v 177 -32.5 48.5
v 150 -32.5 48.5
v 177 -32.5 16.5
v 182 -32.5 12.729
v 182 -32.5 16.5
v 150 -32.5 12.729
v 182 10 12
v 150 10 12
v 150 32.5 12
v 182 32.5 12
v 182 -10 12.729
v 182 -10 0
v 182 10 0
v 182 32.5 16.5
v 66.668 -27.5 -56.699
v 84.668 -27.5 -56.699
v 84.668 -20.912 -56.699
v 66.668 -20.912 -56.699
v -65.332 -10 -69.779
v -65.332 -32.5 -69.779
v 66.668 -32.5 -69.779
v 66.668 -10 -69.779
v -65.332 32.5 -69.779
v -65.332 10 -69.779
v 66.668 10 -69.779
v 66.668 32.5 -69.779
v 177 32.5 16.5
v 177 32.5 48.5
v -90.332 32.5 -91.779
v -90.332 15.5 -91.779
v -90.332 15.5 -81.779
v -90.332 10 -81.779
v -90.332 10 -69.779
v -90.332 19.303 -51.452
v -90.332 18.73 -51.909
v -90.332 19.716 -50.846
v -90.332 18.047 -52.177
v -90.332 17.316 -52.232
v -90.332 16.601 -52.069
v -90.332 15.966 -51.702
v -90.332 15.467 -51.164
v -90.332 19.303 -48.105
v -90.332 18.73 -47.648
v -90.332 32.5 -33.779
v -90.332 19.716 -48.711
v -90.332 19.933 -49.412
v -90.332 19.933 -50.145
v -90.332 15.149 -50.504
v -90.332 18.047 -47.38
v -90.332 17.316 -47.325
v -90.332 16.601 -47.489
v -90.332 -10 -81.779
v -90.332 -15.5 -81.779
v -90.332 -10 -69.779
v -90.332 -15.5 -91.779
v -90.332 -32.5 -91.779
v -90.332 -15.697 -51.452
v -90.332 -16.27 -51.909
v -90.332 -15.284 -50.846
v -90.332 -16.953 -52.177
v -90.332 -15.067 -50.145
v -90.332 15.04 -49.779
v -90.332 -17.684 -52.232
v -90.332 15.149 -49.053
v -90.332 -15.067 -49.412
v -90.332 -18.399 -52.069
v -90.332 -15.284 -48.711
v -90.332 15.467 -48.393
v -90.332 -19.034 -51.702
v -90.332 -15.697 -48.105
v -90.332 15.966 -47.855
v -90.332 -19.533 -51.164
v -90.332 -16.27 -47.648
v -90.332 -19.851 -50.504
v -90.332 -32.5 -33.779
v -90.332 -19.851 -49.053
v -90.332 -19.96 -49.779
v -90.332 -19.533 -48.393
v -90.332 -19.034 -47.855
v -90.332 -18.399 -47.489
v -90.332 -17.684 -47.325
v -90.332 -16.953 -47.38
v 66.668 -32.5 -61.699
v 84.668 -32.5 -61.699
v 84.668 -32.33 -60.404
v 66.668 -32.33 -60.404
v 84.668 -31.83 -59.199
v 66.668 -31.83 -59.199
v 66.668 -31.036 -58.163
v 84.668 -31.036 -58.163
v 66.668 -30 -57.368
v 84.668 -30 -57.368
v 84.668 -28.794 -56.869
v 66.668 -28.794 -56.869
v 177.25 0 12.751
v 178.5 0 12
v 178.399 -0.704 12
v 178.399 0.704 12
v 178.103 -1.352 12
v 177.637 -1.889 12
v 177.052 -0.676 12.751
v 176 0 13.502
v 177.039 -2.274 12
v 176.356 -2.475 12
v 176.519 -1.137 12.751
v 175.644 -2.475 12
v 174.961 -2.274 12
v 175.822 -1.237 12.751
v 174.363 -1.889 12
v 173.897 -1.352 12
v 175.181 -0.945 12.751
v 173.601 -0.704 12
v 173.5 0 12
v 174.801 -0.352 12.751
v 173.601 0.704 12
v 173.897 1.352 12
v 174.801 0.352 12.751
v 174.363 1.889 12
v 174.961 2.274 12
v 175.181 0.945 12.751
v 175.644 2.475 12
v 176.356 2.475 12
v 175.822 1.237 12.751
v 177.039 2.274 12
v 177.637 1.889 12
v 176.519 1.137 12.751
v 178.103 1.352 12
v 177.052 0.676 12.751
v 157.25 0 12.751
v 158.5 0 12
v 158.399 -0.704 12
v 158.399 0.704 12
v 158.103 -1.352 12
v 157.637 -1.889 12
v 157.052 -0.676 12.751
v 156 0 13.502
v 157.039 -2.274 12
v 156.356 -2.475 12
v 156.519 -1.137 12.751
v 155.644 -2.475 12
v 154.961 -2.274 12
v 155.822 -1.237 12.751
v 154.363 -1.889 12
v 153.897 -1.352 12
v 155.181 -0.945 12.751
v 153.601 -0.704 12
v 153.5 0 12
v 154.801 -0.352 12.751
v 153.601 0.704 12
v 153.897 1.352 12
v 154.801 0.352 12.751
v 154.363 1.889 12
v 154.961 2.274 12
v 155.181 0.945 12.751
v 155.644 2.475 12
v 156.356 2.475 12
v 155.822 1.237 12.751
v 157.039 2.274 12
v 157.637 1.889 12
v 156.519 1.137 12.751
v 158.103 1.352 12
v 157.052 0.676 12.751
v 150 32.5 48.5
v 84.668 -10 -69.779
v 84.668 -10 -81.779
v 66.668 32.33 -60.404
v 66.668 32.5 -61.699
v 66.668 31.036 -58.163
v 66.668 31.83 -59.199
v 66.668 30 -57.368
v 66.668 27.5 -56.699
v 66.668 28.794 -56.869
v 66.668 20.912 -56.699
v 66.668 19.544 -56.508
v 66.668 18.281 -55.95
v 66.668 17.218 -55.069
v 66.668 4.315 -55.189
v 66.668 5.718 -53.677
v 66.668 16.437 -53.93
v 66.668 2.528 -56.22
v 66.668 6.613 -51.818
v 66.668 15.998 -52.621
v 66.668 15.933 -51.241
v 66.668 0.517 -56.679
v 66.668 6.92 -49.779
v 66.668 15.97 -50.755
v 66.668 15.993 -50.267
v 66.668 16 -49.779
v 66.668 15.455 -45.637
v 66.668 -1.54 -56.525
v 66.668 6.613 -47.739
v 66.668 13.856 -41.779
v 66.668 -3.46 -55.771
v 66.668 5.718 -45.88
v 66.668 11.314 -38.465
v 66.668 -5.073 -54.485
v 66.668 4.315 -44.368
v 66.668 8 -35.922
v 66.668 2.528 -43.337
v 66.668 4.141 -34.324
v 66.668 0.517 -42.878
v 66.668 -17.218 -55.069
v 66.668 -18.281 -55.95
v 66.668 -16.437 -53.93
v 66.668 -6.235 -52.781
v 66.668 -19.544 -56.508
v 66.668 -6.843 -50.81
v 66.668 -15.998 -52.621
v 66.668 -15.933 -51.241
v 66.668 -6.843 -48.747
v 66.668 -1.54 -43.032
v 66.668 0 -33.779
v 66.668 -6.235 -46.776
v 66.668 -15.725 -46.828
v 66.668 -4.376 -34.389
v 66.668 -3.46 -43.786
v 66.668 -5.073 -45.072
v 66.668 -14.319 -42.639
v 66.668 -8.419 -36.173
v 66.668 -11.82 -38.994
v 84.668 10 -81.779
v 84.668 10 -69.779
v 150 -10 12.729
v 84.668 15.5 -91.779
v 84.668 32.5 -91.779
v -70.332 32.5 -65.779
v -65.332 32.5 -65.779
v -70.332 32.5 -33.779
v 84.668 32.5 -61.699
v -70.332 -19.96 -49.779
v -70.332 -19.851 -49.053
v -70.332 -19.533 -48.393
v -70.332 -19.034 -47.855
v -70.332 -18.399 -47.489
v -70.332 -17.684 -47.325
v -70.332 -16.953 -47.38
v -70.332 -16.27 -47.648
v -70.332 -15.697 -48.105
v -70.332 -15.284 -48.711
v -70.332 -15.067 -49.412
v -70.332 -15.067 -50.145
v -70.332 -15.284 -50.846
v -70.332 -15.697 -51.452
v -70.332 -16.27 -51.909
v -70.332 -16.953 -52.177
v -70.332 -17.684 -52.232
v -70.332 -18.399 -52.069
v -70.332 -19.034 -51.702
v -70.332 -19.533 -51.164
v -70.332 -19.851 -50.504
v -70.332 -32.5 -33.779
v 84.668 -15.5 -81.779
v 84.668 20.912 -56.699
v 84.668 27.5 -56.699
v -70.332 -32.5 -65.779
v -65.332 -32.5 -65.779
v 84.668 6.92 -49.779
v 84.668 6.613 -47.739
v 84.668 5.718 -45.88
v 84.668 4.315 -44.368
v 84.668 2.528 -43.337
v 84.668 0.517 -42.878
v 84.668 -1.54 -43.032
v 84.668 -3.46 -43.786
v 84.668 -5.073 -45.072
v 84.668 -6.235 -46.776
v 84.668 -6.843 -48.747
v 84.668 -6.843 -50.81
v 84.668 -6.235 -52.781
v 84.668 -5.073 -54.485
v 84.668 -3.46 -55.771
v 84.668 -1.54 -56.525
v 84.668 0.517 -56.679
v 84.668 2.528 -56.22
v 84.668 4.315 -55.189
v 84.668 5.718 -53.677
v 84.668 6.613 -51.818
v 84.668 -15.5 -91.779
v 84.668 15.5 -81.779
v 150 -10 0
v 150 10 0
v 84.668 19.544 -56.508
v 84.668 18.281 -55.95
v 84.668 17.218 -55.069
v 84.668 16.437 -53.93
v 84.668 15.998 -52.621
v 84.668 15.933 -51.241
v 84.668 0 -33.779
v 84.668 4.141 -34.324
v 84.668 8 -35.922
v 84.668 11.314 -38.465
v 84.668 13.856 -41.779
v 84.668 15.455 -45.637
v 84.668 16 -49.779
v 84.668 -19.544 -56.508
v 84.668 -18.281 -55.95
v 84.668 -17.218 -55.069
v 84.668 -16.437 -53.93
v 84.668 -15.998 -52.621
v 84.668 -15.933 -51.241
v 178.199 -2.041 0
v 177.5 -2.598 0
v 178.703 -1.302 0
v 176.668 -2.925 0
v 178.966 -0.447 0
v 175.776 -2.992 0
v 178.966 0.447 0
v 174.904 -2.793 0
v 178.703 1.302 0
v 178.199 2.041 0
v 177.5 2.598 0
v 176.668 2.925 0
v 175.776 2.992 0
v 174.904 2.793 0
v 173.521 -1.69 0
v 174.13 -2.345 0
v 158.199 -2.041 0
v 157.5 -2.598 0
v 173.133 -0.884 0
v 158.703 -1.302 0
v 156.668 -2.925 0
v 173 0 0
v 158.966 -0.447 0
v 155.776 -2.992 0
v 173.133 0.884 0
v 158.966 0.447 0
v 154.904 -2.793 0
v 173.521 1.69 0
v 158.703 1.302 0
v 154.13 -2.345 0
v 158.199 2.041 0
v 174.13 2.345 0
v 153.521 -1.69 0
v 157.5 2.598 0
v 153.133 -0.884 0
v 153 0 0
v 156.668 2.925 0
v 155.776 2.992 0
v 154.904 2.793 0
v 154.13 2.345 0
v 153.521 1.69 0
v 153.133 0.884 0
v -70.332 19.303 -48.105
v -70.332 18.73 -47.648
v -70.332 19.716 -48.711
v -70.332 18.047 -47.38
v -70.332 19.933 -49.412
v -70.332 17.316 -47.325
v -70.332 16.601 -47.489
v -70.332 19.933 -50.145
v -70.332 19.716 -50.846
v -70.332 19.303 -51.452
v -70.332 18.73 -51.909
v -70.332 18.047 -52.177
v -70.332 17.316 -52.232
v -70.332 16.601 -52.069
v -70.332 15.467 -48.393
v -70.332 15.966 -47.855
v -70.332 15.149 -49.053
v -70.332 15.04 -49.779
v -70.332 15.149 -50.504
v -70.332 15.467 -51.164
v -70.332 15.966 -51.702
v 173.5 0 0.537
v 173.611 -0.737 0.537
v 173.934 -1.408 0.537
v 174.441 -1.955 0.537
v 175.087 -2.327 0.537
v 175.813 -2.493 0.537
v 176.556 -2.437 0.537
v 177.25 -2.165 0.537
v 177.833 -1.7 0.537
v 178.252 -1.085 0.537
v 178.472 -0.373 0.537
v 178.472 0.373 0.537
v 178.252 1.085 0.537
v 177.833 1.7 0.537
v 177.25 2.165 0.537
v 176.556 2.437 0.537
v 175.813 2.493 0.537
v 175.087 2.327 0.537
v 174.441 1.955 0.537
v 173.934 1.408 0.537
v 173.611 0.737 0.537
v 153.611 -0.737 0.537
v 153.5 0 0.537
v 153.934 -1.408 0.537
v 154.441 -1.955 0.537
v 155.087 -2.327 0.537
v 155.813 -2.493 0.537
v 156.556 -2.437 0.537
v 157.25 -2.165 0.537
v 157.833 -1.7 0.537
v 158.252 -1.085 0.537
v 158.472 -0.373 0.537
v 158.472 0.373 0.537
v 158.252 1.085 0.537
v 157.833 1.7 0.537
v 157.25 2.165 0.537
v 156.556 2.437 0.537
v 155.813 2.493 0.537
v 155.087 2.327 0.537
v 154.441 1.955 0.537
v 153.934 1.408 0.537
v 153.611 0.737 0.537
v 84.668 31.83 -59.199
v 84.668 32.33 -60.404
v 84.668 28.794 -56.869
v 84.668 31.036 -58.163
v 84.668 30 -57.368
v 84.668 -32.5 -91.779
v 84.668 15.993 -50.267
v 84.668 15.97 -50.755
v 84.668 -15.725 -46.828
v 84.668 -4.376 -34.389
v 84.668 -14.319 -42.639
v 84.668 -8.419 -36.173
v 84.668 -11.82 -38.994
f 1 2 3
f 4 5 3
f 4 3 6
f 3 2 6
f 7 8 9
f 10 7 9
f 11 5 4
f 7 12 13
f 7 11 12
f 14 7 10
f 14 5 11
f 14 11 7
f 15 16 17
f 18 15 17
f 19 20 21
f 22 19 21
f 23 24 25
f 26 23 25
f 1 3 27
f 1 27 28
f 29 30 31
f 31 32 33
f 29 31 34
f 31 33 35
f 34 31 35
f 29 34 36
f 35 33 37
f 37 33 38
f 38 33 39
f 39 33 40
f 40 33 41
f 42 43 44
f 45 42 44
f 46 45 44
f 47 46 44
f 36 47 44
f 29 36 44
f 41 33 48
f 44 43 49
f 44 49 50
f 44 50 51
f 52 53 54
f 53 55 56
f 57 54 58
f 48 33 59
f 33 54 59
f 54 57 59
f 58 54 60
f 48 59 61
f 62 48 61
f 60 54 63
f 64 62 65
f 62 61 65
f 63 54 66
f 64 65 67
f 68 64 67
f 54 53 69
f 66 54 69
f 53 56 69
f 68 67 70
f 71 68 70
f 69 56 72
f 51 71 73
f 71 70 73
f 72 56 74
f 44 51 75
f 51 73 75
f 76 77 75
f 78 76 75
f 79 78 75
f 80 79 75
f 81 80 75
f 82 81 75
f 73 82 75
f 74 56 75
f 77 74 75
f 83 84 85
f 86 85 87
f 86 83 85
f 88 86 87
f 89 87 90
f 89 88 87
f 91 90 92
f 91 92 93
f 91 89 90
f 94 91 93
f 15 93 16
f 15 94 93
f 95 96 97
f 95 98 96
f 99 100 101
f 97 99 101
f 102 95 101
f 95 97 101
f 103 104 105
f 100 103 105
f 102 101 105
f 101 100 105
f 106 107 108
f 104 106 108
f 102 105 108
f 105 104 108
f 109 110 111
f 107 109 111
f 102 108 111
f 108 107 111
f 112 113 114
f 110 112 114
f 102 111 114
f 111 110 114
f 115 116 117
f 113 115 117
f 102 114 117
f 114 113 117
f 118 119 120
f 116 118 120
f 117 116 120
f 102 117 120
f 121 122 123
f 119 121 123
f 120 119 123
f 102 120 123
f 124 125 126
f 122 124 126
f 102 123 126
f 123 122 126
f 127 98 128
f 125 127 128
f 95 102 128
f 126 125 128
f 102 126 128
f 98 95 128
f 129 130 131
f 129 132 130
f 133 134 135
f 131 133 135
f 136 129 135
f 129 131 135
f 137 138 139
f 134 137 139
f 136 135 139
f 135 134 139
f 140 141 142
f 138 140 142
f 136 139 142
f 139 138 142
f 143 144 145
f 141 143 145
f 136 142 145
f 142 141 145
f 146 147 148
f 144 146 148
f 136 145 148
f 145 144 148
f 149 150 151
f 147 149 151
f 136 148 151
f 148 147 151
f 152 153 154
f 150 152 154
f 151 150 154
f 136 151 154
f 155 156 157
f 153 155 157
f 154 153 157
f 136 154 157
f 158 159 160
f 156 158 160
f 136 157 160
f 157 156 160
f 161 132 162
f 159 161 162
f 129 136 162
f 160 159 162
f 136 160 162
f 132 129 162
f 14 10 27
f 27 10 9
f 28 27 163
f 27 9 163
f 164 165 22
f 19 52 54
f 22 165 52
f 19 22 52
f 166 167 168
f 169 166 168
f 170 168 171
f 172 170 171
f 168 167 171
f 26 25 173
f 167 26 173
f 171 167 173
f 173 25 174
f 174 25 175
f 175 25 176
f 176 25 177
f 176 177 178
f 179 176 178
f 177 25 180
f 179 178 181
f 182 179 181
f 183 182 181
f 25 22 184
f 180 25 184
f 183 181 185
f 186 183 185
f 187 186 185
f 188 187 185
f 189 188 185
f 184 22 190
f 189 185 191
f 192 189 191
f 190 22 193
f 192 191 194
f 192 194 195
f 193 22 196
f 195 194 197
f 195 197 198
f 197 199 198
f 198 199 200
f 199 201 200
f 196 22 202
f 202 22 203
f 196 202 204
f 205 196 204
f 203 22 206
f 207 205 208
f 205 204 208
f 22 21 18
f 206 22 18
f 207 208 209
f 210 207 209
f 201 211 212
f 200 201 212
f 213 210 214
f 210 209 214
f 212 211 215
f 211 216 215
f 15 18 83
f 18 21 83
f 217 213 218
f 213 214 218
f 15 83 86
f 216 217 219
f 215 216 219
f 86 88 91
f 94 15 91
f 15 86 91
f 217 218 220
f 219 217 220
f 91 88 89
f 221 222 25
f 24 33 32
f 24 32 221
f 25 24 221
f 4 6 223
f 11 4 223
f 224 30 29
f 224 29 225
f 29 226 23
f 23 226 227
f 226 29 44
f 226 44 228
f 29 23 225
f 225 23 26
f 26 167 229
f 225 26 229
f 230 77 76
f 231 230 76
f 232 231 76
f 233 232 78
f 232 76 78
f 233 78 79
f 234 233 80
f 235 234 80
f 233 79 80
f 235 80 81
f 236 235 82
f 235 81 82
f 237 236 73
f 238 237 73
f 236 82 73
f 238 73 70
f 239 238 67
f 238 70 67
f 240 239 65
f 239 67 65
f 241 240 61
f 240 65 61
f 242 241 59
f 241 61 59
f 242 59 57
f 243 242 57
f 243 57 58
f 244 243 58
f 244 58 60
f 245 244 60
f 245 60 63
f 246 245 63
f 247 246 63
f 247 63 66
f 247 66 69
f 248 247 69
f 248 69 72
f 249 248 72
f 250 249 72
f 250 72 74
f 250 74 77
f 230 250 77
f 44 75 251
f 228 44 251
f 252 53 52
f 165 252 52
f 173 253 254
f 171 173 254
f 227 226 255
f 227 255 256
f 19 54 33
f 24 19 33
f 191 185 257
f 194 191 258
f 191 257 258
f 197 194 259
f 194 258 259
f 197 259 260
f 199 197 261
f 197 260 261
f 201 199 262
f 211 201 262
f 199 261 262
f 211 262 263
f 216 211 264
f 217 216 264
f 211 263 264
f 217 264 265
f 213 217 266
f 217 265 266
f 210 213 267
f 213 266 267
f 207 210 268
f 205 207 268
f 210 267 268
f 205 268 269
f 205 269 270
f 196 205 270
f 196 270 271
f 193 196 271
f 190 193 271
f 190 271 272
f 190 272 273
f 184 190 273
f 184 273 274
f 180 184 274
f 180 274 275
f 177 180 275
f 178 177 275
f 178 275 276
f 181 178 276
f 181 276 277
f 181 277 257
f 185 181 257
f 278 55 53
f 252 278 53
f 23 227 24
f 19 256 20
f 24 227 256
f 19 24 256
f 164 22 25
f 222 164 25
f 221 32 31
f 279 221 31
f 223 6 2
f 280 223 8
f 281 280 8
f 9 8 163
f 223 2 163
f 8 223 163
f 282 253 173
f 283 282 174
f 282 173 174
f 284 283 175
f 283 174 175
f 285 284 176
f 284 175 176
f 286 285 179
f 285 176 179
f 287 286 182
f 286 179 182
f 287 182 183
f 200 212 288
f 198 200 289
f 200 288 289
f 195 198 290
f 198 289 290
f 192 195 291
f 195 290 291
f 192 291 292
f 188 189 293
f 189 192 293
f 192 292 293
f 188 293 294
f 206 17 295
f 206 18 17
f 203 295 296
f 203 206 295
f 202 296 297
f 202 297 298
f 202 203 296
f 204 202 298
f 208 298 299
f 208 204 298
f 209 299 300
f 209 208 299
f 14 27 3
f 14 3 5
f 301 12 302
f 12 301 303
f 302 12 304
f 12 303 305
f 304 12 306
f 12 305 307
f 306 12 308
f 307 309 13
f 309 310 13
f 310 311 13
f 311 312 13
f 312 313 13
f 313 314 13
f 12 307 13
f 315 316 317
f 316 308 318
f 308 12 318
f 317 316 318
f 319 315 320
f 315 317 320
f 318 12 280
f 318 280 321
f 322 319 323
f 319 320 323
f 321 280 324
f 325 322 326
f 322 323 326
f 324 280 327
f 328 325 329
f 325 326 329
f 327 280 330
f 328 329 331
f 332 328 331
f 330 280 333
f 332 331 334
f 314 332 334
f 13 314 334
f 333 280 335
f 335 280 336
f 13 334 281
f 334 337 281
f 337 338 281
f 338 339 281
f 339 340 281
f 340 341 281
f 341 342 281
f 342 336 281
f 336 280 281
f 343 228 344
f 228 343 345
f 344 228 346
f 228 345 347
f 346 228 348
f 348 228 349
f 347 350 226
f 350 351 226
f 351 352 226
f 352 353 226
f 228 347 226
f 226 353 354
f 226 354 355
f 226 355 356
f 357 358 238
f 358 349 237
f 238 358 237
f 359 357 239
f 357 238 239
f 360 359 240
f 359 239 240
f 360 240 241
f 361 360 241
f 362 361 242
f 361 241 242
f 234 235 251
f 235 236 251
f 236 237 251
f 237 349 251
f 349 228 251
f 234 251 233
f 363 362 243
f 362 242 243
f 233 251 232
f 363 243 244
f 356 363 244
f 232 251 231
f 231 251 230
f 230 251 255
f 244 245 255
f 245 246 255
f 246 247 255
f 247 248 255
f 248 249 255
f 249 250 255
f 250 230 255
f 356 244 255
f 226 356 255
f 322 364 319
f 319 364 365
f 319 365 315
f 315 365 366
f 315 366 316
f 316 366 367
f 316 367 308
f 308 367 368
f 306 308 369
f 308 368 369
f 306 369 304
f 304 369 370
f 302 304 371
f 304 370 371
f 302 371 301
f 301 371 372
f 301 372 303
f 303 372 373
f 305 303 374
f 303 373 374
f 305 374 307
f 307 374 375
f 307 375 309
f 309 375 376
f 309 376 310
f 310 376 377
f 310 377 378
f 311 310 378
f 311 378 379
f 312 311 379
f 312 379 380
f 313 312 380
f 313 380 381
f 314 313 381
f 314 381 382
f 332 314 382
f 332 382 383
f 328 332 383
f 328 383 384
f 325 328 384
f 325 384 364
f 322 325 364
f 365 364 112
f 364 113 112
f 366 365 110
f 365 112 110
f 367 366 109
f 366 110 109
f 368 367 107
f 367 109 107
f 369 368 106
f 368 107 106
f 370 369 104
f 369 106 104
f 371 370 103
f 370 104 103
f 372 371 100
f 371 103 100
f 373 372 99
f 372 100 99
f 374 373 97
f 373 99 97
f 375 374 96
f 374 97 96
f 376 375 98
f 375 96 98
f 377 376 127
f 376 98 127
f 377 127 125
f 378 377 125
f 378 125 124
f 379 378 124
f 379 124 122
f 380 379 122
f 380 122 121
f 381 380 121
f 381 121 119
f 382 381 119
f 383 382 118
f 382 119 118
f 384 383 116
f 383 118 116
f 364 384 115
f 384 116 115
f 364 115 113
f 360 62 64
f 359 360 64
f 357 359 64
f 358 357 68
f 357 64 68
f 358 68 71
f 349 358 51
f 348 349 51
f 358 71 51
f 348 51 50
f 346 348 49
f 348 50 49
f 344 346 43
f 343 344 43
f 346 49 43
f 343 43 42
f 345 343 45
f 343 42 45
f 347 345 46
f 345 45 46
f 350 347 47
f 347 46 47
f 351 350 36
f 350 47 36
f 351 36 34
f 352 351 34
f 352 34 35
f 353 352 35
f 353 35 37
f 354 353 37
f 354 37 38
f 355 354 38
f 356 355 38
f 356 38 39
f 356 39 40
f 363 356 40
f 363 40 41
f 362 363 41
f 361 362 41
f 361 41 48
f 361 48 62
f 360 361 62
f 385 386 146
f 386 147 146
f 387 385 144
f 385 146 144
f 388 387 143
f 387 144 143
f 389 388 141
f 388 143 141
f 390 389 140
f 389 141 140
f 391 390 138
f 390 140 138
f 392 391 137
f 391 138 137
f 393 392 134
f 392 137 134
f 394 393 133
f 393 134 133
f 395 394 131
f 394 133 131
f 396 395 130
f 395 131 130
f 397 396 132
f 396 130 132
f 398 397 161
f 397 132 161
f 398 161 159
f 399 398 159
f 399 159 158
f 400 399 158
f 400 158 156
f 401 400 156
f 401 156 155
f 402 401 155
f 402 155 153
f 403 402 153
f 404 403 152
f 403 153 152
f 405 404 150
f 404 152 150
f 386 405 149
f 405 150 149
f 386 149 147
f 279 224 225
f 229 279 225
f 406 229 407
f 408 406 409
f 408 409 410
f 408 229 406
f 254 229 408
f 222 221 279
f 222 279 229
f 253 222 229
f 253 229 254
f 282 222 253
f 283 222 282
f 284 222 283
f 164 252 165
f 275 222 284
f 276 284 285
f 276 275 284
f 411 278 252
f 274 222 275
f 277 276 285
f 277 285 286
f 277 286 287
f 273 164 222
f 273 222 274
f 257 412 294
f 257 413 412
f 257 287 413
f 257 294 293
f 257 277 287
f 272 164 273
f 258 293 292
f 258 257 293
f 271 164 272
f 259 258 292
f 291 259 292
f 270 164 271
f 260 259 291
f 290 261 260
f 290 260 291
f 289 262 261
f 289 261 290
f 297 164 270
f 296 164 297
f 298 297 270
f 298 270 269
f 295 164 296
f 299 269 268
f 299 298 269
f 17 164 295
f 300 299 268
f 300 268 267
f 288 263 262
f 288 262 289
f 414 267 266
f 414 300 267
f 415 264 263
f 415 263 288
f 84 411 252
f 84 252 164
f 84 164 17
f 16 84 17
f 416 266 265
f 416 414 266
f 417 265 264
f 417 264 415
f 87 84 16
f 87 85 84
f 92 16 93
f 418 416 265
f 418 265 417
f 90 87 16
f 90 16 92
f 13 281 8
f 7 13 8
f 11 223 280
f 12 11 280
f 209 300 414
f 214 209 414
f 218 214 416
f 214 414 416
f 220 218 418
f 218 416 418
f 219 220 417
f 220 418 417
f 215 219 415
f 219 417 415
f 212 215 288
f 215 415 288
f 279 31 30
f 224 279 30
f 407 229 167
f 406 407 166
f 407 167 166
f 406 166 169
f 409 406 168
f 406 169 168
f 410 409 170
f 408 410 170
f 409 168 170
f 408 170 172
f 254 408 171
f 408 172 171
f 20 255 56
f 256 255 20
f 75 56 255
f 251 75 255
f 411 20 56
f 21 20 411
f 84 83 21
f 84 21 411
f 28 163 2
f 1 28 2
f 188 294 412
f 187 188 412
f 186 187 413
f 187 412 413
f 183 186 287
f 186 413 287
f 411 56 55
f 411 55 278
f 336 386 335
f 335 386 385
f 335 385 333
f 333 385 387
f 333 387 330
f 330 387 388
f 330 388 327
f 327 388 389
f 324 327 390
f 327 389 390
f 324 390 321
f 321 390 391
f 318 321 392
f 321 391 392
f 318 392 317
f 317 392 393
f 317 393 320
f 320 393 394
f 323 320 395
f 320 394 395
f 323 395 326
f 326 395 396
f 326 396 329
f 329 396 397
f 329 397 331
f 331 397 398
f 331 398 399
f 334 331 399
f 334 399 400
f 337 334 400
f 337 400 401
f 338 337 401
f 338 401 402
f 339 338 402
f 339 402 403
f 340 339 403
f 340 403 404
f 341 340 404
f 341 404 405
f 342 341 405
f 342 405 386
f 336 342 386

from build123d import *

# Parameters (mm, degrees)
F0_W            = 175
F0_H            = 58
F1_DEPTH        = 32.5
F3_DEPTH        = 175
F5_DEPTH        = 65
F6_R            = 6.92
F7_DEPTH        = 25
F8_R            = 5
F9_R            = 2.46
F10_DEPTH       = 25
F13_DEPTH       = 32
F14_W           = 5
F14_H           = 32
F15_DEPTH       = 70
F17_D           = 5
F17_DEPTH       = 12
F17_CSINK_D     = 6
F17_CSINK_ANGLE = 85.9436692696
F17_TIP         = 1.5021515476


with BuildPart() as f1:
    # F0 (on Front) → F1 (new body, symmetric)
    with BuildSketch(Plane.XZ):
        with Locations((-2.832442522, -62.7785622664)):
            Rectangle(F0_W, F0_H)
    extrude(amount=F1_DEPTH, both=True)

    # F2 (on face) → F3 (cut)
    with BuildSketch(Plane(origin=(-90.332442522, 0, 0), x_dir=(0, -1, 0), z_dir=(-1, 0, 0))):
        Polygon((-15.5, -91.7785622664), (0, -91.7785622664), (15.5, -91.7785622664), (15.5, -81.7785622664), (10, -81.7785622664), (10, -69.7785622664), (0, -69.7785622664), (-10, -69.7785622664), (-10, -81.7785622664), (-15.5, -81.7785622664), align=None)
    extrude(amount=-F3_DEPTH, mode=Mode.SUBTRACT)

    # F4 (on face) → F5 (cut)
    with BuildSketch(Plane.XZ.offset(32.5)):
        Polygon((-70.332442522, -33.7785622664), (-70.332442522, -65.7785622664), (-65.332442522, -65.7785622664), (-65.332442522, -69.7785622664), (66.667557478, -69.7785622664), (66.667557478, -33.7785622664), align=None)
    extrude(amount=-F5_DEPTH, mode=Mode.SUBTRACT)

    # F6 (on face) → F7 (cut)
    with BuildSketch(Plane.YZ.offset(84.667557478)):
        with BuildLine():
            ThreePointArc((0, -33.7785622664), (11.313708499, -38.4648537674), (16, -49.7785622664))
            ThreePointArc((16, -49.7785622664), (15.6015750322, -53.32692196), (14.4261429357, -56.6985622664))
            Line((14.4261429357, -56.6985622664), (32.5, -56.6985622664))
            Line((32.5, -56.6985622664), (32.5, -33.7785622664))
            Line((32.5, -33.7785622664), (0, -33.7785622664))
        make_face()
        with BuildLine():
            ThreePointArc((-14.4261429357, -56.6985622664), (-13.5410487038, -41.2556519654), (0, -33.7785622664))
            Line((0, -33.7785622664), (-32.5, -33.7785622664))
            Line((-32.5, -33.7785622664), (-32.5, -56.6985622664))
            Line((-32.5, -56.6985622664), (-14.4261429357, -56.6985622664))
        make_face()
        with Locations((0, -49.7785622664)):
            Circle(F6_R)
    extrude(amount=-F7_DEPTH, mode=Mode.SUBTRACT)

    # F8
    f8_edges = [f1.edges().sort_by_distance(p)[0] for p in [
        (75.667557, -14.426143, -56.698562),
        (75.667557, 14.426143, -56.698562),
        (75.667557, 32.5, -56.698562),
        (75.667557, -32.5, -56.698562),
    ]]
    fillet(f8_edges, radius=F8_R)

    # F9 (on face) → F10 (cut)
    with BuildSketch(Plane(origin=(-90.332442522, 0, 0), x_dir=(0, -1, 0), z_dir=(-1, 0, 0))):
        with Locations((17.5, -49.7785622664)):
            Circle(F9_R)
        with Locations((-17.5, -49.7785622664)):
            Circle(F9_R)
    extrude(amount=-F10_DEPTH, mode=Mode.SUBTRACT)


with BuildPart() as f13:
    # F12 (on offset) → F13 (new body)
    with BuildSketch(Plane.YZ.offset(150)):
        Polygon((0, 0), (10, 0), (10, 12), (32.5, 12), (32.5, 48.5), (0, 48.5), (-32.5, 48.5), (-32.5, 12.7285346389), (-10, 12.7285346389), (-10, 0), align=None)
    extrude(amount=F13_DEPTH)

    # F14 (on face) → F15 (cut)
    with BuildSketch(Plane.XZ.offset(32.5)):
        with Locations((179.5, 32.5)):
            Rectangle(F14_W, F14_H)
    extrude(amount=-F15_DEPTH, mode=Mode.SUBTRACT)

    # F17
    with Locations(Plane(origin=(0, 0, 0), x_dir=(1, 0, 0), z_dir=(0, 0, -1))):
        with Locations((176, 0), (156, 0)):
            CounterSinkHole(F17_D / 2, F17_CSINK_D / 2, depth=F17_DEPTH, counter_sink_angle=F17_CSINK_ANGLE)
            with Locations((0, 0, -(F17_DEPTH + F17_TIP / 2))):  # 118° drill point
                Cone(0, F17_D / 2, F17_TIP, mode=Mode.SUBTRACT)


solid = Compound([f1.part, f13.part])
